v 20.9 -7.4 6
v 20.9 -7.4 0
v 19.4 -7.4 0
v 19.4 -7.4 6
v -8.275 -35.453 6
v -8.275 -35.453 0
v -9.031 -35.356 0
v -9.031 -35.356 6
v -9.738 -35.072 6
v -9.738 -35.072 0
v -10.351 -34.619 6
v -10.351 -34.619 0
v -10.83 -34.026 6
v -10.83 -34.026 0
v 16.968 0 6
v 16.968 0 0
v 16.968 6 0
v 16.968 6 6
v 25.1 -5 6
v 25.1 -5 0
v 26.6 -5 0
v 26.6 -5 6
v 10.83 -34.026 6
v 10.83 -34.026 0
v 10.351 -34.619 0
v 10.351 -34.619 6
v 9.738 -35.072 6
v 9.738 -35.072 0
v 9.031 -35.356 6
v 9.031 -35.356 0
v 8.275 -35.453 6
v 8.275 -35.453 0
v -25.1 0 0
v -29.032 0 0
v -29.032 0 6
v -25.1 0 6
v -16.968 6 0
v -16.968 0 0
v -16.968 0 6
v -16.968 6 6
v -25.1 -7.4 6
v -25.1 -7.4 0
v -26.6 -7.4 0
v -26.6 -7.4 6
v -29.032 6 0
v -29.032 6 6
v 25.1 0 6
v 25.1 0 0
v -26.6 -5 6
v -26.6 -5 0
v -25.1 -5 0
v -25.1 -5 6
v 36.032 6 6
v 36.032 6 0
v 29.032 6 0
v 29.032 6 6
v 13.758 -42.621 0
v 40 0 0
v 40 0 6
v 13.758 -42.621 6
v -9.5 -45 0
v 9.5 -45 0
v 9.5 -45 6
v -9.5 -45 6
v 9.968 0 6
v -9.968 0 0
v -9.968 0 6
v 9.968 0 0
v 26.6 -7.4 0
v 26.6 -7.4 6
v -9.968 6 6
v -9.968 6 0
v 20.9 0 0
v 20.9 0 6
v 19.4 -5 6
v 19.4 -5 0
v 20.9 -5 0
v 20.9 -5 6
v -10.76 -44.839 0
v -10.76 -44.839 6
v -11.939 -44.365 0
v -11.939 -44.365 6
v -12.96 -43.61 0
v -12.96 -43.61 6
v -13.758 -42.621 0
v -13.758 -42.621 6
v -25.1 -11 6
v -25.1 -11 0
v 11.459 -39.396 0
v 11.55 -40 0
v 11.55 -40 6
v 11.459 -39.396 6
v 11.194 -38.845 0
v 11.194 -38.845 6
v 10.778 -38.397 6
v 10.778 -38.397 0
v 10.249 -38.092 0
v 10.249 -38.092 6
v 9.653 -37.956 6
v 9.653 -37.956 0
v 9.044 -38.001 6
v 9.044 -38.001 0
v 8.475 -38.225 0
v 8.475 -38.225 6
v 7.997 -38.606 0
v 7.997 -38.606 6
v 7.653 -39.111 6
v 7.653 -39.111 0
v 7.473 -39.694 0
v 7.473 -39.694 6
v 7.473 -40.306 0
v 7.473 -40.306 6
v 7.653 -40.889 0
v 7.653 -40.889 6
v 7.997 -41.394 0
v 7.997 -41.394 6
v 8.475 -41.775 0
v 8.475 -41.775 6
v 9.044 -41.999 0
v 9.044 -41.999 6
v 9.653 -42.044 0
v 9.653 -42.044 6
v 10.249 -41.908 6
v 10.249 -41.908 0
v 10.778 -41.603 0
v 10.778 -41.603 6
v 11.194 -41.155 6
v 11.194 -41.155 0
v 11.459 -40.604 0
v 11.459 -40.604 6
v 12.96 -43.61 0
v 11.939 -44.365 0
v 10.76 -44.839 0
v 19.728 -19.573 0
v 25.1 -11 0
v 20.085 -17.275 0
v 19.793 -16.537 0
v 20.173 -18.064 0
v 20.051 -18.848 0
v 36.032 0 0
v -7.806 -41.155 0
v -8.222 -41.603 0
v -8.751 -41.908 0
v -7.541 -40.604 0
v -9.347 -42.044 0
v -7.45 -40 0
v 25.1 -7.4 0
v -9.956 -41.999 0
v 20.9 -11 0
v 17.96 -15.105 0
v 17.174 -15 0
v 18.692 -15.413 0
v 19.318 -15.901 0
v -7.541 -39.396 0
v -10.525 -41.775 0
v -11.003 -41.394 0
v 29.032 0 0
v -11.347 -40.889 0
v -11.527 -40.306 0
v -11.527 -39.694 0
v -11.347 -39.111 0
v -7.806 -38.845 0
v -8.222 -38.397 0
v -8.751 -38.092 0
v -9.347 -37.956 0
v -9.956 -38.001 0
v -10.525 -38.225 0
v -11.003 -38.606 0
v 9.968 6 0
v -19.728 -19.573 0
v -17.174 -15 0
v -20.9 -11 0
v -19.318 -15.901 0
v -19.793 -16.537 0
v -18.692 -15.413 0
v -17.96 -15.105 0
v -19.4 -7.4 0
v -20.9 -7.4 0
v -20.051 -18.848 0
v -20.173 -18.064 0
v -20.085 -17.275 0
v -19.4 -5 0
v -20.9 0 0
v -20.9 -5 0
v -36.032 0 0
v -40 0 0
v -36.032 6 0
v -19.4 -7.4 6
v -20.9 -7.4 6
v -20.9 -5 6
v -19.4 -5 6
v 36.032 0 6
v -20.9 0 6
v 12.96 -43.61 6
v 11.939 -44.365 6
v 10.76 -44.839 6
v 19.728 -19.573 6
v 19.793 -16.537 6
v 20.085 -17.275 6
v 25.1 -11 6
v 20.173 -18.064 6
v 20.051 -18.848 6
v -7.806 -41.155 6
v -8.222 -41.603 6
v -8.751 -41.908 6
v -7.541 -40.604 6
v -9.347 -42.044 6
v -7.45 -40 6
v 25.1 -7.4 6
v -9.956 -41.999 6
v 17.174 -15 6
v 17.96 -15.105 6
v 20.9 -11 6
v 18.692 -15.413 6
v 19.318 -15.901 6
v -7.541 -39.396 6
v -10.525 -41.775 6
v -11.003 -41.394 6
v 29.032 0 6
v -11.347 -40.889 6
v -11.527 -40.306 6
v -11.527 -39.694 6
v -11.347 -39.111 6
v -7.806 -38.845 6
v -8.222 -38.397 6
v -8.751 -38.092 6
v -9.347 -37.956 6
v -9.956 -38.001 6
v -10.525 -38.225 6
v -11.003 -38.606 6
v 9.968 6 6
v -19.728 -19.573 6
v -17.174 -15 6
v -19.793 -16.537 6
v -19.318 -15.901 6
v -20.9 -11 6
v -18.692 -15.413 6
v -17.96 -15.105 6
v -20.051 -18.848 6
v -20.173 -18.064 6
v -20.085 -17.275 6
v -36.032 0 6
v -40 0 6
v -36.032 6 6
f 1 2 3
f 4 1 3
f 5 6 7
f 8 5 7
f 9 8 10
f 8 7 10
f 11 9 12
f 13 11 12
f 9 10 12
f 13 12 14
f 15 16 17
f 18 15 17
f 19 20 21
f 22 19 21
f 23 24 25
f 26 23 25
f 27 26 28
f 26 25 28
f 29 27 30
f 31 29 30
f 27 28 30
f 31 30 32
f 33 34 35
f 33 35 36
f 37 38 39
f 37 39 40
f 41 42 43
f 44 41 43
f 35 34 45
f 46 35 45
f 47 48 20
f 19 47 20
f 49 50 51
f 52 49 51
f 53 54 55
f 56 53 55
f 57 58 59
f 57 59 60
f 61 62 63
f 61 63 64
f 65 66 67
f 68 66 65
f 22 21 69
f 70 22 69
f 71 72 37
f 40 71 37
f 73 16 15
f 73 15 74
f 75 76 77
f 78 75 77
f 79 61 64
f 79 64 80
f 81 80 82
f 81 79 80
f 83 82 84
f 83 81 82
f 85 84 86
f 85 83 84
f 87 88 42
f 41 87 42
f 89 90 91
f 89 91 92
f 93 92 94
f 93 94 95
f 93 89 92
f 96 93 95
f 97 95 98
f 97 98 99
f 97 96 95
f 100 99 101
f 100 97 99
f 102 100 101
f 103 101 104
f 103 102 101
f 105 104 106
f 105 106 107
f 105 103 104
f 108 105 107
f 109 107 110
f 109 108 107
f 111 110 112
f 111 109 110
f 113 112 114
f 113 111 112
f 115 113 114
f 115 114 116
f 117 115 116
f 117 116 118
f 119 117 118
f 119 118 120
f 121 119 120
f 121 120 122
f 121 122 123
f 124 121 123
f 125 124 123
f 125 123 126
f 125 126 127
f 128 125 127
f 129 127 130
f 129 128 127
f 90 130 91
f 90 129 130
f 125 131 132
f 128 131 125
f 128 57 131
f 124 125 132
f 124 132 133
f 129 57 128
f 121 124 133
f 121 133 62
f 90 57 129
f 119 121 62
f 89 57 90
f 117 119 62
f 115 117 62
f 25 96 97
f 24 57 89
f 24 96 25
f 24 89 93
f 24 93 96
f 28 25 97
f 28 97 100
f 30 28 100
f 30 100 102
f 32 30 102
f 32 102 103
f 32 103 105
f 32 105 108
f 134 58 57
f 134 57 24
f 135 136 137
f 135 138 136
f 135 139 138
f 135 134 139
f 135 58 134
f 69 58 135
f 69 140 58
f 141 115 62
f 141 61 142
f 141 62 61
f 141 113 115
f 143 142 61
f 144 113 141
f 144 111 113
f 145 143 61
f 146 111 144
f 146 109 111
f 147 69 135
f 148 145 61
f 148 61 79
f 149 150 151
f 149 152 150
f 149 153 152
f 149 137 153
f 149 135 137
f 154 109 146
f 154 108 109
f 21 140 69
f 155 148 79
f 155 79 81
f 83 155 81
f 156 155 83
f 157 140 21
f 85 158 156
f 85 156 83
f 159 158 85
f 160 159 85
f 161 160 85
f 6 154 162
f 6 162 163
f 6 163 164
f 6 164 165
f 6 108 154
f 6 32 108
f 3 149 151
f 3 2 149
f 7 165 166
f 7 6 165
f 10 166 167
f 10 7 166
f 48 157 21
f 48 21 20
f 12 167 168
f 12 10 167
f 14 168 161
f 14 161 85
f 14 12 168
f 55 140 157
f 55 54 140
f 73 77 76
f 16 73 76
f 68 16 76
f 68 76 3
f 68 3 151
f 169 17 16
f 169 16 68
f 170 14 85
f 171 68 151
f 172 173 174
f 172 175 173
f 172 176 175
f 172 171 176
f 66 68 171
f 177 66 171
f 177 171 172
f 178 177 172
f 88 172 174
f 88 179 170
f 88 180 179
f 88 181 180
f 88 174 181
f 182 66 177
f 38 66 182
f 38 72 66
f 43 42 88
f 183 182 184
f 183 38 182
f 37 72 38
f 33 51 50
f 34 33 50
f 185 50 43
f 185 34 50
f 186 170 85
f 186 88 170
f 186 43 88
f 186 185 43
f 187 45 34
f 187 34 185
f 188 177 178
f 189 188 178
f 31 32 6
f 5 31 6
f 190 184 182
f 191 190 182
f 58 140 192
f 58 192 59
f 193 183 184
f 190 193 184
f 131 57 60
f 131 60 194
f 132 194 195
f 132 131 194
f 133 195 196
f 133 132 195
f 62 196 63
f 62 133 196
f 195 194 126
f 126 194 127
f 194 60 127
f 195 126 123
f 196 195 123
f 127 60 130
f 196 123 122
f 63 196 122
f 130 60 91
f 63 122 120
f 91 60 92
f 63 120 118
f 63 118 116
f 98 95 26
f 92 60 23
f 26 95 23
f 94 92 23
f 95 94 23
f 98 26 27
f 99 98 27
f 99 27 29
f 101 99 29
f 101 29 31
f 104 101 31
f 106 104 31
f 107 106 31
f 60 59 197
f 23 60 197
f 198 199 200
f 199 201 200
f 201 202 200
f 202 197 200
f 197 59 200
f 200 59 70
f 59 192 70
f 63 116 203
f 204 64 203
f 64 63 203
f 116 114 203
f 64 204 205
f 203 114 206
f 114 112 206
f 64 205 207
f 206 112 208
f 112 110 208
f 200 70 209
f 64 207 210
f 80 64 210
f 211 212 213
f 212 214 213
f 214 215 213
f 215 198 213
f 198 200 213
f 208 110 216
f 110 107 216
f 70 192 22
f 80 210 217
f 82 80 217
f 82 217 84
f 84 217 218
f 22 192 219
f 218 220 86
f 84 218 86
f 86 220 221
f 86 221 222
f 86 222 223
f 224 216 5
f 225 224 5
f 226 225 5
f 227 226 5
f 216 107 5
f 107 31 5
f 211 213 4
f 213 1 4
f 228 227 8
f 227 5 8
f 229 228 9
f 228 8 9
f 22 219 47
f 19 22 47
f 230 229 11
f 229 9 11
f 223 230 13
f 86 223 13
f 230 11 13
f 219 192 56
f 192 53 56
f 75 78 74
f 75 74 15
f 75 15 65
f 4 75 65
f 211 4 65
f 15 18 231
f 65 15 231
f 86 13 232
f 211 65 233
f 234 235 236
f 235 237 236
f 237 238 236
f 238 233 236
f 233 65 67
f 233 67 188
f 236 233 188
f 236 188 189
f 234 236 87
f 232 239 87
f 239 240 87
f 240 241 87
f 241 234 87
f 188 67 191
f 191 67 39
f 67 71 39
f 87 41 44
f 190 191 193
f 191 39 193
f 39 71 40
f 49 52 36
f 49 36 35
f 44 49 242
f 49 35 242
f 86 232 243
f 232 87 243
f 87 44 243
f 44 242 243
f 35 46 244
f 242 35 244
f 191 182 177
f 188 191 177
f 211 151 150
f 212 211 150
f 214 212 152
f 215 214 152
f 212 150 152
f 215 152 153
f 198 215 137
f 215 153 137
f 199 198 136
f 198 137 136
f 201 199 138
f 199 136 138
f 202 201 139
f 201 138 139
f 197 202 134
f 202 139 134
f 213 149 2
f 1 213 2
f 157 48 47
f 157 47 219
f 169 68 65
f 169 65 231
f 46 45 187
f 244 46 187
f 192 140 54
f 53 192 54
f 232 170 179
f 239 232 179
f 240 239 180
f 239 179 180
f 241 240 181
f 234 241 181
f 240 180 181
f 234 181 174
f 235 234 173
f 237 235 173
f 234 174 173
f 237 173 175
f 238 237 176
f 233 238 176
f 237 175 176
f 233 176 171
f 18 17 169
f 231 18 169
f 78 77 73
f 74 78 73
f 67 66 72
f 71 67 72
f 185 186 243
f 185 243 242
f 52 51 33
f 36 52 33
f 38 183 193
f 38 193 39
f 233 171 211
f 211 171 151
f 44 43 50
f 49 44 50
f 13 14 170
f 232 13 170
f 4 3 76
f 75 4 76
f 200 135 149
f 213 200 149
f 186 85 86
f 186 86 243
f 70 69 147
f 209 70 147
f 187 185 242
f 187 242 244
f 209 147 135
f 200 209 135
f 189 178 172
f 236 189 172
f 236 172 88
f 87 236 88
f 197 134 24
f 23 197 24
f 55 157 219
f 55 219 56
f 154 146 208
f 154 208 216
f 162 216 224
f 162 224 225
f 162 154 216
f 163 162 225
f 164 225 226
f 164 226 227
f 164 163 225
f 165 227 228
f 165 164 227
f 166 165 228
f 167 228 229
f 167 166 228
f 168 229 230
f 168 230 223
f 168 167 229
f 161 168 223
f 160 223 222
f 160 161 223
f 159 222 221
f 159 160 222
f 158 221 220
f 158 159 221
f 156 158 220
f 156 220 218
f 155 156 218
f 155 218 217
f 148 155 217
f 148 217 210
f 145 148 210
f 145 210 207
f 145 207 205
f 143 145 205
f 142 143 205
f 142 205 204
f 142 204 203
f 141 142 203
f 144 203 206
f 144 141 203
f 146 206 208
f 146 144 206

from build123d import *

# Parameters (mm, degrees)
SKETCH_1_R           = 2.05
EXTRUDE_1_DEPTH      = 6
SKETCH_2_W           = 7
SKETCH_2_H           = 6
EXTRUDE_2_DEPTH      = 6
CUT_EXTRUDE_1_DEPTH  = 7
SKETCH_21_W          = 7
SKETCH_21_H          = 6
EXTRUDE_21_DEPTH     = 6
SKETCH_22_W          = 7
SKETCH_22_H          = 6
EXTRUDE_22_DEPTH     = 6
CUT_EXTRUDE_12_DEPTH = 7


with BuildPart() as part:
    # Эскиз1 → Бобышка-Вытянуть1 (new body)
    with BuildSketch(Plane.XY):
        with BuildLine():
            Line((-40, 0), (40, 0))
            Line((40, 0), (13.757679871, -42.621480902))
            ThreePointArc((13.757679871, -42.621480902), (11.938503177, -44.365054668), (9.5, -45))
            Line((9.5, -45), (-9.5, -45))
            ThreePointArc((-9.5, -45), (-11.938503177, -44.365054668), (-13.757679871, -42.621480902))
            Line((-13.757679871, -42.621480902), (-40, 0))
        make_face()
        with Locations((-9.5, -40)):
            Circle(SKETCH_1_R, mode=Mode.SUBTRACT)
        with Locations((9.5, -40)):
            Circle(SKETCH_1_R, mode=Mode.SUBTRACT)
        with BuildLine():
            Line((-17.17379907, -15), (17.17379907, -15))
            ThreePointArc((17.17379907, -15), (19.792831871, -16.536898094), (19.728406993, -19.572888541))
            Line((19.728406993, -19.572888541), (10.829793891, -34.025576661))
            ThreePointArc((10.829793891, -34.025576661), (9.738287875, -35.071720921), (8.275185968, -35.45268812))
            Line((8.275185968, -35.45268812), (-8.275185968, -35.45268812))
            ThreePointArc((-8.275185968, -35.45268812), (-9.738287875, -35.071720921), (-10.829793891, -34.025576661))
            Line((-10.829793891, -34.025576661), (-19.728406993, -19.572888541))
            ThreePointArc((-19.728406993, -19.572888541), (-19.792831871, -16.536898094), (-17.17379907, -15))
        make_face(mode=Mode.SUBTRACT)
    extrude(amount=EXTRUDE_1_DEPTH)

    # Эскиз2 → Бобышка-Вытянуть2 (add)
    with BuildSketch(Plane(origin=(-23, -50, 0), x_dir=(-1, 0, 0), z_dir=(0, 0, -1))):
        with Locations((-9.531849908, 53)):
            Rectangle(SKETCH_2_W, SKETCH_2_H)
        with Locations((9.531849908, 53)):
            Rectangle(SKETCH_2_W, SKETCH_2_H)
    extrude(amount=-EXTRUDE_2_DEPTH)

    # Эскиз3 → Вырез-Вытянуть1 (cut, through all)
    with BuildSketch(Plane(origin=(-23, -50, 0), x_dir=(-1, 0, 0), z_dir=(0, 0, -1))):
        Polygon((-2.1, 45), (-3.6, 45), (-3.6, 42.6), (-2.1, 42.6), (-2.1, 39), (2.1, 39), (2.1, 42.6), (3.6, 42.6), (3.6, 45), (2.1, 45), (2.1, 50), (-2.1, 50), align=None)
    extrude(amount=-CUT_EXTRUDE_1_DEPTH, mode=Mode.SUBTRACT)

    # Эскиз21 → Бобышка-Вытянуть21 (add)
    with BuildSketch(Plane(origin=(-23, -50, 6), x_dir=(1, 0, 0), z_dir=(0, 0, 1))):
        with Locations((-9.531849908, 53)):
            Rectangle(SKETCH_21_W, SKETCH_21_H)
        with Locations((9.531849908, 53)):
            Rectangle(SKETCH_21_W, SKETCH_21_H)
    extrude(amount=-EXTRUDE_21_DEPTH)

    # Эскиз22 → Бобышка-Вытянуть22 (add)
    with BuildSketch(Plane(origin=(23, -50, 0), x_dir=(-1, 0, 0), z_dir=(0, 0, -1))):
        with Locations((-9.531849908, 53)):
            Rectangle(SKETCH_22_W, SKETCH_22_H)
        with Locations((9.531849908, 53)):
            Rectangle(SKETCH_22_W, SKETCH_22_H)
    extrude(amount=-EXTRUDE_22_DEPTH)

    # Эскиз32 → Вырез-Вытянуть12 (cut, through all)
    with BuildSketch(Plane(origin=(23, -50, 0), x_dir=(-1, 0, 0), z_dir=(0, 0, -1))):
        Polygon((-2.1, 45), (-3.6, 45), (-3.6, 42.6), (-2.1, 42.6), (-2.1, 39), (2.1, 39), (2.1, 42.6), (3.6, 42.6), (3.6, 45), (2.1, 45), (2.1, 50), (-2.1, 50), align=None)
    extrude(amount=-CUT_EXTRUDE_12_DEPTH, mode=Mode.SUBTRACT)


solid = part.part
